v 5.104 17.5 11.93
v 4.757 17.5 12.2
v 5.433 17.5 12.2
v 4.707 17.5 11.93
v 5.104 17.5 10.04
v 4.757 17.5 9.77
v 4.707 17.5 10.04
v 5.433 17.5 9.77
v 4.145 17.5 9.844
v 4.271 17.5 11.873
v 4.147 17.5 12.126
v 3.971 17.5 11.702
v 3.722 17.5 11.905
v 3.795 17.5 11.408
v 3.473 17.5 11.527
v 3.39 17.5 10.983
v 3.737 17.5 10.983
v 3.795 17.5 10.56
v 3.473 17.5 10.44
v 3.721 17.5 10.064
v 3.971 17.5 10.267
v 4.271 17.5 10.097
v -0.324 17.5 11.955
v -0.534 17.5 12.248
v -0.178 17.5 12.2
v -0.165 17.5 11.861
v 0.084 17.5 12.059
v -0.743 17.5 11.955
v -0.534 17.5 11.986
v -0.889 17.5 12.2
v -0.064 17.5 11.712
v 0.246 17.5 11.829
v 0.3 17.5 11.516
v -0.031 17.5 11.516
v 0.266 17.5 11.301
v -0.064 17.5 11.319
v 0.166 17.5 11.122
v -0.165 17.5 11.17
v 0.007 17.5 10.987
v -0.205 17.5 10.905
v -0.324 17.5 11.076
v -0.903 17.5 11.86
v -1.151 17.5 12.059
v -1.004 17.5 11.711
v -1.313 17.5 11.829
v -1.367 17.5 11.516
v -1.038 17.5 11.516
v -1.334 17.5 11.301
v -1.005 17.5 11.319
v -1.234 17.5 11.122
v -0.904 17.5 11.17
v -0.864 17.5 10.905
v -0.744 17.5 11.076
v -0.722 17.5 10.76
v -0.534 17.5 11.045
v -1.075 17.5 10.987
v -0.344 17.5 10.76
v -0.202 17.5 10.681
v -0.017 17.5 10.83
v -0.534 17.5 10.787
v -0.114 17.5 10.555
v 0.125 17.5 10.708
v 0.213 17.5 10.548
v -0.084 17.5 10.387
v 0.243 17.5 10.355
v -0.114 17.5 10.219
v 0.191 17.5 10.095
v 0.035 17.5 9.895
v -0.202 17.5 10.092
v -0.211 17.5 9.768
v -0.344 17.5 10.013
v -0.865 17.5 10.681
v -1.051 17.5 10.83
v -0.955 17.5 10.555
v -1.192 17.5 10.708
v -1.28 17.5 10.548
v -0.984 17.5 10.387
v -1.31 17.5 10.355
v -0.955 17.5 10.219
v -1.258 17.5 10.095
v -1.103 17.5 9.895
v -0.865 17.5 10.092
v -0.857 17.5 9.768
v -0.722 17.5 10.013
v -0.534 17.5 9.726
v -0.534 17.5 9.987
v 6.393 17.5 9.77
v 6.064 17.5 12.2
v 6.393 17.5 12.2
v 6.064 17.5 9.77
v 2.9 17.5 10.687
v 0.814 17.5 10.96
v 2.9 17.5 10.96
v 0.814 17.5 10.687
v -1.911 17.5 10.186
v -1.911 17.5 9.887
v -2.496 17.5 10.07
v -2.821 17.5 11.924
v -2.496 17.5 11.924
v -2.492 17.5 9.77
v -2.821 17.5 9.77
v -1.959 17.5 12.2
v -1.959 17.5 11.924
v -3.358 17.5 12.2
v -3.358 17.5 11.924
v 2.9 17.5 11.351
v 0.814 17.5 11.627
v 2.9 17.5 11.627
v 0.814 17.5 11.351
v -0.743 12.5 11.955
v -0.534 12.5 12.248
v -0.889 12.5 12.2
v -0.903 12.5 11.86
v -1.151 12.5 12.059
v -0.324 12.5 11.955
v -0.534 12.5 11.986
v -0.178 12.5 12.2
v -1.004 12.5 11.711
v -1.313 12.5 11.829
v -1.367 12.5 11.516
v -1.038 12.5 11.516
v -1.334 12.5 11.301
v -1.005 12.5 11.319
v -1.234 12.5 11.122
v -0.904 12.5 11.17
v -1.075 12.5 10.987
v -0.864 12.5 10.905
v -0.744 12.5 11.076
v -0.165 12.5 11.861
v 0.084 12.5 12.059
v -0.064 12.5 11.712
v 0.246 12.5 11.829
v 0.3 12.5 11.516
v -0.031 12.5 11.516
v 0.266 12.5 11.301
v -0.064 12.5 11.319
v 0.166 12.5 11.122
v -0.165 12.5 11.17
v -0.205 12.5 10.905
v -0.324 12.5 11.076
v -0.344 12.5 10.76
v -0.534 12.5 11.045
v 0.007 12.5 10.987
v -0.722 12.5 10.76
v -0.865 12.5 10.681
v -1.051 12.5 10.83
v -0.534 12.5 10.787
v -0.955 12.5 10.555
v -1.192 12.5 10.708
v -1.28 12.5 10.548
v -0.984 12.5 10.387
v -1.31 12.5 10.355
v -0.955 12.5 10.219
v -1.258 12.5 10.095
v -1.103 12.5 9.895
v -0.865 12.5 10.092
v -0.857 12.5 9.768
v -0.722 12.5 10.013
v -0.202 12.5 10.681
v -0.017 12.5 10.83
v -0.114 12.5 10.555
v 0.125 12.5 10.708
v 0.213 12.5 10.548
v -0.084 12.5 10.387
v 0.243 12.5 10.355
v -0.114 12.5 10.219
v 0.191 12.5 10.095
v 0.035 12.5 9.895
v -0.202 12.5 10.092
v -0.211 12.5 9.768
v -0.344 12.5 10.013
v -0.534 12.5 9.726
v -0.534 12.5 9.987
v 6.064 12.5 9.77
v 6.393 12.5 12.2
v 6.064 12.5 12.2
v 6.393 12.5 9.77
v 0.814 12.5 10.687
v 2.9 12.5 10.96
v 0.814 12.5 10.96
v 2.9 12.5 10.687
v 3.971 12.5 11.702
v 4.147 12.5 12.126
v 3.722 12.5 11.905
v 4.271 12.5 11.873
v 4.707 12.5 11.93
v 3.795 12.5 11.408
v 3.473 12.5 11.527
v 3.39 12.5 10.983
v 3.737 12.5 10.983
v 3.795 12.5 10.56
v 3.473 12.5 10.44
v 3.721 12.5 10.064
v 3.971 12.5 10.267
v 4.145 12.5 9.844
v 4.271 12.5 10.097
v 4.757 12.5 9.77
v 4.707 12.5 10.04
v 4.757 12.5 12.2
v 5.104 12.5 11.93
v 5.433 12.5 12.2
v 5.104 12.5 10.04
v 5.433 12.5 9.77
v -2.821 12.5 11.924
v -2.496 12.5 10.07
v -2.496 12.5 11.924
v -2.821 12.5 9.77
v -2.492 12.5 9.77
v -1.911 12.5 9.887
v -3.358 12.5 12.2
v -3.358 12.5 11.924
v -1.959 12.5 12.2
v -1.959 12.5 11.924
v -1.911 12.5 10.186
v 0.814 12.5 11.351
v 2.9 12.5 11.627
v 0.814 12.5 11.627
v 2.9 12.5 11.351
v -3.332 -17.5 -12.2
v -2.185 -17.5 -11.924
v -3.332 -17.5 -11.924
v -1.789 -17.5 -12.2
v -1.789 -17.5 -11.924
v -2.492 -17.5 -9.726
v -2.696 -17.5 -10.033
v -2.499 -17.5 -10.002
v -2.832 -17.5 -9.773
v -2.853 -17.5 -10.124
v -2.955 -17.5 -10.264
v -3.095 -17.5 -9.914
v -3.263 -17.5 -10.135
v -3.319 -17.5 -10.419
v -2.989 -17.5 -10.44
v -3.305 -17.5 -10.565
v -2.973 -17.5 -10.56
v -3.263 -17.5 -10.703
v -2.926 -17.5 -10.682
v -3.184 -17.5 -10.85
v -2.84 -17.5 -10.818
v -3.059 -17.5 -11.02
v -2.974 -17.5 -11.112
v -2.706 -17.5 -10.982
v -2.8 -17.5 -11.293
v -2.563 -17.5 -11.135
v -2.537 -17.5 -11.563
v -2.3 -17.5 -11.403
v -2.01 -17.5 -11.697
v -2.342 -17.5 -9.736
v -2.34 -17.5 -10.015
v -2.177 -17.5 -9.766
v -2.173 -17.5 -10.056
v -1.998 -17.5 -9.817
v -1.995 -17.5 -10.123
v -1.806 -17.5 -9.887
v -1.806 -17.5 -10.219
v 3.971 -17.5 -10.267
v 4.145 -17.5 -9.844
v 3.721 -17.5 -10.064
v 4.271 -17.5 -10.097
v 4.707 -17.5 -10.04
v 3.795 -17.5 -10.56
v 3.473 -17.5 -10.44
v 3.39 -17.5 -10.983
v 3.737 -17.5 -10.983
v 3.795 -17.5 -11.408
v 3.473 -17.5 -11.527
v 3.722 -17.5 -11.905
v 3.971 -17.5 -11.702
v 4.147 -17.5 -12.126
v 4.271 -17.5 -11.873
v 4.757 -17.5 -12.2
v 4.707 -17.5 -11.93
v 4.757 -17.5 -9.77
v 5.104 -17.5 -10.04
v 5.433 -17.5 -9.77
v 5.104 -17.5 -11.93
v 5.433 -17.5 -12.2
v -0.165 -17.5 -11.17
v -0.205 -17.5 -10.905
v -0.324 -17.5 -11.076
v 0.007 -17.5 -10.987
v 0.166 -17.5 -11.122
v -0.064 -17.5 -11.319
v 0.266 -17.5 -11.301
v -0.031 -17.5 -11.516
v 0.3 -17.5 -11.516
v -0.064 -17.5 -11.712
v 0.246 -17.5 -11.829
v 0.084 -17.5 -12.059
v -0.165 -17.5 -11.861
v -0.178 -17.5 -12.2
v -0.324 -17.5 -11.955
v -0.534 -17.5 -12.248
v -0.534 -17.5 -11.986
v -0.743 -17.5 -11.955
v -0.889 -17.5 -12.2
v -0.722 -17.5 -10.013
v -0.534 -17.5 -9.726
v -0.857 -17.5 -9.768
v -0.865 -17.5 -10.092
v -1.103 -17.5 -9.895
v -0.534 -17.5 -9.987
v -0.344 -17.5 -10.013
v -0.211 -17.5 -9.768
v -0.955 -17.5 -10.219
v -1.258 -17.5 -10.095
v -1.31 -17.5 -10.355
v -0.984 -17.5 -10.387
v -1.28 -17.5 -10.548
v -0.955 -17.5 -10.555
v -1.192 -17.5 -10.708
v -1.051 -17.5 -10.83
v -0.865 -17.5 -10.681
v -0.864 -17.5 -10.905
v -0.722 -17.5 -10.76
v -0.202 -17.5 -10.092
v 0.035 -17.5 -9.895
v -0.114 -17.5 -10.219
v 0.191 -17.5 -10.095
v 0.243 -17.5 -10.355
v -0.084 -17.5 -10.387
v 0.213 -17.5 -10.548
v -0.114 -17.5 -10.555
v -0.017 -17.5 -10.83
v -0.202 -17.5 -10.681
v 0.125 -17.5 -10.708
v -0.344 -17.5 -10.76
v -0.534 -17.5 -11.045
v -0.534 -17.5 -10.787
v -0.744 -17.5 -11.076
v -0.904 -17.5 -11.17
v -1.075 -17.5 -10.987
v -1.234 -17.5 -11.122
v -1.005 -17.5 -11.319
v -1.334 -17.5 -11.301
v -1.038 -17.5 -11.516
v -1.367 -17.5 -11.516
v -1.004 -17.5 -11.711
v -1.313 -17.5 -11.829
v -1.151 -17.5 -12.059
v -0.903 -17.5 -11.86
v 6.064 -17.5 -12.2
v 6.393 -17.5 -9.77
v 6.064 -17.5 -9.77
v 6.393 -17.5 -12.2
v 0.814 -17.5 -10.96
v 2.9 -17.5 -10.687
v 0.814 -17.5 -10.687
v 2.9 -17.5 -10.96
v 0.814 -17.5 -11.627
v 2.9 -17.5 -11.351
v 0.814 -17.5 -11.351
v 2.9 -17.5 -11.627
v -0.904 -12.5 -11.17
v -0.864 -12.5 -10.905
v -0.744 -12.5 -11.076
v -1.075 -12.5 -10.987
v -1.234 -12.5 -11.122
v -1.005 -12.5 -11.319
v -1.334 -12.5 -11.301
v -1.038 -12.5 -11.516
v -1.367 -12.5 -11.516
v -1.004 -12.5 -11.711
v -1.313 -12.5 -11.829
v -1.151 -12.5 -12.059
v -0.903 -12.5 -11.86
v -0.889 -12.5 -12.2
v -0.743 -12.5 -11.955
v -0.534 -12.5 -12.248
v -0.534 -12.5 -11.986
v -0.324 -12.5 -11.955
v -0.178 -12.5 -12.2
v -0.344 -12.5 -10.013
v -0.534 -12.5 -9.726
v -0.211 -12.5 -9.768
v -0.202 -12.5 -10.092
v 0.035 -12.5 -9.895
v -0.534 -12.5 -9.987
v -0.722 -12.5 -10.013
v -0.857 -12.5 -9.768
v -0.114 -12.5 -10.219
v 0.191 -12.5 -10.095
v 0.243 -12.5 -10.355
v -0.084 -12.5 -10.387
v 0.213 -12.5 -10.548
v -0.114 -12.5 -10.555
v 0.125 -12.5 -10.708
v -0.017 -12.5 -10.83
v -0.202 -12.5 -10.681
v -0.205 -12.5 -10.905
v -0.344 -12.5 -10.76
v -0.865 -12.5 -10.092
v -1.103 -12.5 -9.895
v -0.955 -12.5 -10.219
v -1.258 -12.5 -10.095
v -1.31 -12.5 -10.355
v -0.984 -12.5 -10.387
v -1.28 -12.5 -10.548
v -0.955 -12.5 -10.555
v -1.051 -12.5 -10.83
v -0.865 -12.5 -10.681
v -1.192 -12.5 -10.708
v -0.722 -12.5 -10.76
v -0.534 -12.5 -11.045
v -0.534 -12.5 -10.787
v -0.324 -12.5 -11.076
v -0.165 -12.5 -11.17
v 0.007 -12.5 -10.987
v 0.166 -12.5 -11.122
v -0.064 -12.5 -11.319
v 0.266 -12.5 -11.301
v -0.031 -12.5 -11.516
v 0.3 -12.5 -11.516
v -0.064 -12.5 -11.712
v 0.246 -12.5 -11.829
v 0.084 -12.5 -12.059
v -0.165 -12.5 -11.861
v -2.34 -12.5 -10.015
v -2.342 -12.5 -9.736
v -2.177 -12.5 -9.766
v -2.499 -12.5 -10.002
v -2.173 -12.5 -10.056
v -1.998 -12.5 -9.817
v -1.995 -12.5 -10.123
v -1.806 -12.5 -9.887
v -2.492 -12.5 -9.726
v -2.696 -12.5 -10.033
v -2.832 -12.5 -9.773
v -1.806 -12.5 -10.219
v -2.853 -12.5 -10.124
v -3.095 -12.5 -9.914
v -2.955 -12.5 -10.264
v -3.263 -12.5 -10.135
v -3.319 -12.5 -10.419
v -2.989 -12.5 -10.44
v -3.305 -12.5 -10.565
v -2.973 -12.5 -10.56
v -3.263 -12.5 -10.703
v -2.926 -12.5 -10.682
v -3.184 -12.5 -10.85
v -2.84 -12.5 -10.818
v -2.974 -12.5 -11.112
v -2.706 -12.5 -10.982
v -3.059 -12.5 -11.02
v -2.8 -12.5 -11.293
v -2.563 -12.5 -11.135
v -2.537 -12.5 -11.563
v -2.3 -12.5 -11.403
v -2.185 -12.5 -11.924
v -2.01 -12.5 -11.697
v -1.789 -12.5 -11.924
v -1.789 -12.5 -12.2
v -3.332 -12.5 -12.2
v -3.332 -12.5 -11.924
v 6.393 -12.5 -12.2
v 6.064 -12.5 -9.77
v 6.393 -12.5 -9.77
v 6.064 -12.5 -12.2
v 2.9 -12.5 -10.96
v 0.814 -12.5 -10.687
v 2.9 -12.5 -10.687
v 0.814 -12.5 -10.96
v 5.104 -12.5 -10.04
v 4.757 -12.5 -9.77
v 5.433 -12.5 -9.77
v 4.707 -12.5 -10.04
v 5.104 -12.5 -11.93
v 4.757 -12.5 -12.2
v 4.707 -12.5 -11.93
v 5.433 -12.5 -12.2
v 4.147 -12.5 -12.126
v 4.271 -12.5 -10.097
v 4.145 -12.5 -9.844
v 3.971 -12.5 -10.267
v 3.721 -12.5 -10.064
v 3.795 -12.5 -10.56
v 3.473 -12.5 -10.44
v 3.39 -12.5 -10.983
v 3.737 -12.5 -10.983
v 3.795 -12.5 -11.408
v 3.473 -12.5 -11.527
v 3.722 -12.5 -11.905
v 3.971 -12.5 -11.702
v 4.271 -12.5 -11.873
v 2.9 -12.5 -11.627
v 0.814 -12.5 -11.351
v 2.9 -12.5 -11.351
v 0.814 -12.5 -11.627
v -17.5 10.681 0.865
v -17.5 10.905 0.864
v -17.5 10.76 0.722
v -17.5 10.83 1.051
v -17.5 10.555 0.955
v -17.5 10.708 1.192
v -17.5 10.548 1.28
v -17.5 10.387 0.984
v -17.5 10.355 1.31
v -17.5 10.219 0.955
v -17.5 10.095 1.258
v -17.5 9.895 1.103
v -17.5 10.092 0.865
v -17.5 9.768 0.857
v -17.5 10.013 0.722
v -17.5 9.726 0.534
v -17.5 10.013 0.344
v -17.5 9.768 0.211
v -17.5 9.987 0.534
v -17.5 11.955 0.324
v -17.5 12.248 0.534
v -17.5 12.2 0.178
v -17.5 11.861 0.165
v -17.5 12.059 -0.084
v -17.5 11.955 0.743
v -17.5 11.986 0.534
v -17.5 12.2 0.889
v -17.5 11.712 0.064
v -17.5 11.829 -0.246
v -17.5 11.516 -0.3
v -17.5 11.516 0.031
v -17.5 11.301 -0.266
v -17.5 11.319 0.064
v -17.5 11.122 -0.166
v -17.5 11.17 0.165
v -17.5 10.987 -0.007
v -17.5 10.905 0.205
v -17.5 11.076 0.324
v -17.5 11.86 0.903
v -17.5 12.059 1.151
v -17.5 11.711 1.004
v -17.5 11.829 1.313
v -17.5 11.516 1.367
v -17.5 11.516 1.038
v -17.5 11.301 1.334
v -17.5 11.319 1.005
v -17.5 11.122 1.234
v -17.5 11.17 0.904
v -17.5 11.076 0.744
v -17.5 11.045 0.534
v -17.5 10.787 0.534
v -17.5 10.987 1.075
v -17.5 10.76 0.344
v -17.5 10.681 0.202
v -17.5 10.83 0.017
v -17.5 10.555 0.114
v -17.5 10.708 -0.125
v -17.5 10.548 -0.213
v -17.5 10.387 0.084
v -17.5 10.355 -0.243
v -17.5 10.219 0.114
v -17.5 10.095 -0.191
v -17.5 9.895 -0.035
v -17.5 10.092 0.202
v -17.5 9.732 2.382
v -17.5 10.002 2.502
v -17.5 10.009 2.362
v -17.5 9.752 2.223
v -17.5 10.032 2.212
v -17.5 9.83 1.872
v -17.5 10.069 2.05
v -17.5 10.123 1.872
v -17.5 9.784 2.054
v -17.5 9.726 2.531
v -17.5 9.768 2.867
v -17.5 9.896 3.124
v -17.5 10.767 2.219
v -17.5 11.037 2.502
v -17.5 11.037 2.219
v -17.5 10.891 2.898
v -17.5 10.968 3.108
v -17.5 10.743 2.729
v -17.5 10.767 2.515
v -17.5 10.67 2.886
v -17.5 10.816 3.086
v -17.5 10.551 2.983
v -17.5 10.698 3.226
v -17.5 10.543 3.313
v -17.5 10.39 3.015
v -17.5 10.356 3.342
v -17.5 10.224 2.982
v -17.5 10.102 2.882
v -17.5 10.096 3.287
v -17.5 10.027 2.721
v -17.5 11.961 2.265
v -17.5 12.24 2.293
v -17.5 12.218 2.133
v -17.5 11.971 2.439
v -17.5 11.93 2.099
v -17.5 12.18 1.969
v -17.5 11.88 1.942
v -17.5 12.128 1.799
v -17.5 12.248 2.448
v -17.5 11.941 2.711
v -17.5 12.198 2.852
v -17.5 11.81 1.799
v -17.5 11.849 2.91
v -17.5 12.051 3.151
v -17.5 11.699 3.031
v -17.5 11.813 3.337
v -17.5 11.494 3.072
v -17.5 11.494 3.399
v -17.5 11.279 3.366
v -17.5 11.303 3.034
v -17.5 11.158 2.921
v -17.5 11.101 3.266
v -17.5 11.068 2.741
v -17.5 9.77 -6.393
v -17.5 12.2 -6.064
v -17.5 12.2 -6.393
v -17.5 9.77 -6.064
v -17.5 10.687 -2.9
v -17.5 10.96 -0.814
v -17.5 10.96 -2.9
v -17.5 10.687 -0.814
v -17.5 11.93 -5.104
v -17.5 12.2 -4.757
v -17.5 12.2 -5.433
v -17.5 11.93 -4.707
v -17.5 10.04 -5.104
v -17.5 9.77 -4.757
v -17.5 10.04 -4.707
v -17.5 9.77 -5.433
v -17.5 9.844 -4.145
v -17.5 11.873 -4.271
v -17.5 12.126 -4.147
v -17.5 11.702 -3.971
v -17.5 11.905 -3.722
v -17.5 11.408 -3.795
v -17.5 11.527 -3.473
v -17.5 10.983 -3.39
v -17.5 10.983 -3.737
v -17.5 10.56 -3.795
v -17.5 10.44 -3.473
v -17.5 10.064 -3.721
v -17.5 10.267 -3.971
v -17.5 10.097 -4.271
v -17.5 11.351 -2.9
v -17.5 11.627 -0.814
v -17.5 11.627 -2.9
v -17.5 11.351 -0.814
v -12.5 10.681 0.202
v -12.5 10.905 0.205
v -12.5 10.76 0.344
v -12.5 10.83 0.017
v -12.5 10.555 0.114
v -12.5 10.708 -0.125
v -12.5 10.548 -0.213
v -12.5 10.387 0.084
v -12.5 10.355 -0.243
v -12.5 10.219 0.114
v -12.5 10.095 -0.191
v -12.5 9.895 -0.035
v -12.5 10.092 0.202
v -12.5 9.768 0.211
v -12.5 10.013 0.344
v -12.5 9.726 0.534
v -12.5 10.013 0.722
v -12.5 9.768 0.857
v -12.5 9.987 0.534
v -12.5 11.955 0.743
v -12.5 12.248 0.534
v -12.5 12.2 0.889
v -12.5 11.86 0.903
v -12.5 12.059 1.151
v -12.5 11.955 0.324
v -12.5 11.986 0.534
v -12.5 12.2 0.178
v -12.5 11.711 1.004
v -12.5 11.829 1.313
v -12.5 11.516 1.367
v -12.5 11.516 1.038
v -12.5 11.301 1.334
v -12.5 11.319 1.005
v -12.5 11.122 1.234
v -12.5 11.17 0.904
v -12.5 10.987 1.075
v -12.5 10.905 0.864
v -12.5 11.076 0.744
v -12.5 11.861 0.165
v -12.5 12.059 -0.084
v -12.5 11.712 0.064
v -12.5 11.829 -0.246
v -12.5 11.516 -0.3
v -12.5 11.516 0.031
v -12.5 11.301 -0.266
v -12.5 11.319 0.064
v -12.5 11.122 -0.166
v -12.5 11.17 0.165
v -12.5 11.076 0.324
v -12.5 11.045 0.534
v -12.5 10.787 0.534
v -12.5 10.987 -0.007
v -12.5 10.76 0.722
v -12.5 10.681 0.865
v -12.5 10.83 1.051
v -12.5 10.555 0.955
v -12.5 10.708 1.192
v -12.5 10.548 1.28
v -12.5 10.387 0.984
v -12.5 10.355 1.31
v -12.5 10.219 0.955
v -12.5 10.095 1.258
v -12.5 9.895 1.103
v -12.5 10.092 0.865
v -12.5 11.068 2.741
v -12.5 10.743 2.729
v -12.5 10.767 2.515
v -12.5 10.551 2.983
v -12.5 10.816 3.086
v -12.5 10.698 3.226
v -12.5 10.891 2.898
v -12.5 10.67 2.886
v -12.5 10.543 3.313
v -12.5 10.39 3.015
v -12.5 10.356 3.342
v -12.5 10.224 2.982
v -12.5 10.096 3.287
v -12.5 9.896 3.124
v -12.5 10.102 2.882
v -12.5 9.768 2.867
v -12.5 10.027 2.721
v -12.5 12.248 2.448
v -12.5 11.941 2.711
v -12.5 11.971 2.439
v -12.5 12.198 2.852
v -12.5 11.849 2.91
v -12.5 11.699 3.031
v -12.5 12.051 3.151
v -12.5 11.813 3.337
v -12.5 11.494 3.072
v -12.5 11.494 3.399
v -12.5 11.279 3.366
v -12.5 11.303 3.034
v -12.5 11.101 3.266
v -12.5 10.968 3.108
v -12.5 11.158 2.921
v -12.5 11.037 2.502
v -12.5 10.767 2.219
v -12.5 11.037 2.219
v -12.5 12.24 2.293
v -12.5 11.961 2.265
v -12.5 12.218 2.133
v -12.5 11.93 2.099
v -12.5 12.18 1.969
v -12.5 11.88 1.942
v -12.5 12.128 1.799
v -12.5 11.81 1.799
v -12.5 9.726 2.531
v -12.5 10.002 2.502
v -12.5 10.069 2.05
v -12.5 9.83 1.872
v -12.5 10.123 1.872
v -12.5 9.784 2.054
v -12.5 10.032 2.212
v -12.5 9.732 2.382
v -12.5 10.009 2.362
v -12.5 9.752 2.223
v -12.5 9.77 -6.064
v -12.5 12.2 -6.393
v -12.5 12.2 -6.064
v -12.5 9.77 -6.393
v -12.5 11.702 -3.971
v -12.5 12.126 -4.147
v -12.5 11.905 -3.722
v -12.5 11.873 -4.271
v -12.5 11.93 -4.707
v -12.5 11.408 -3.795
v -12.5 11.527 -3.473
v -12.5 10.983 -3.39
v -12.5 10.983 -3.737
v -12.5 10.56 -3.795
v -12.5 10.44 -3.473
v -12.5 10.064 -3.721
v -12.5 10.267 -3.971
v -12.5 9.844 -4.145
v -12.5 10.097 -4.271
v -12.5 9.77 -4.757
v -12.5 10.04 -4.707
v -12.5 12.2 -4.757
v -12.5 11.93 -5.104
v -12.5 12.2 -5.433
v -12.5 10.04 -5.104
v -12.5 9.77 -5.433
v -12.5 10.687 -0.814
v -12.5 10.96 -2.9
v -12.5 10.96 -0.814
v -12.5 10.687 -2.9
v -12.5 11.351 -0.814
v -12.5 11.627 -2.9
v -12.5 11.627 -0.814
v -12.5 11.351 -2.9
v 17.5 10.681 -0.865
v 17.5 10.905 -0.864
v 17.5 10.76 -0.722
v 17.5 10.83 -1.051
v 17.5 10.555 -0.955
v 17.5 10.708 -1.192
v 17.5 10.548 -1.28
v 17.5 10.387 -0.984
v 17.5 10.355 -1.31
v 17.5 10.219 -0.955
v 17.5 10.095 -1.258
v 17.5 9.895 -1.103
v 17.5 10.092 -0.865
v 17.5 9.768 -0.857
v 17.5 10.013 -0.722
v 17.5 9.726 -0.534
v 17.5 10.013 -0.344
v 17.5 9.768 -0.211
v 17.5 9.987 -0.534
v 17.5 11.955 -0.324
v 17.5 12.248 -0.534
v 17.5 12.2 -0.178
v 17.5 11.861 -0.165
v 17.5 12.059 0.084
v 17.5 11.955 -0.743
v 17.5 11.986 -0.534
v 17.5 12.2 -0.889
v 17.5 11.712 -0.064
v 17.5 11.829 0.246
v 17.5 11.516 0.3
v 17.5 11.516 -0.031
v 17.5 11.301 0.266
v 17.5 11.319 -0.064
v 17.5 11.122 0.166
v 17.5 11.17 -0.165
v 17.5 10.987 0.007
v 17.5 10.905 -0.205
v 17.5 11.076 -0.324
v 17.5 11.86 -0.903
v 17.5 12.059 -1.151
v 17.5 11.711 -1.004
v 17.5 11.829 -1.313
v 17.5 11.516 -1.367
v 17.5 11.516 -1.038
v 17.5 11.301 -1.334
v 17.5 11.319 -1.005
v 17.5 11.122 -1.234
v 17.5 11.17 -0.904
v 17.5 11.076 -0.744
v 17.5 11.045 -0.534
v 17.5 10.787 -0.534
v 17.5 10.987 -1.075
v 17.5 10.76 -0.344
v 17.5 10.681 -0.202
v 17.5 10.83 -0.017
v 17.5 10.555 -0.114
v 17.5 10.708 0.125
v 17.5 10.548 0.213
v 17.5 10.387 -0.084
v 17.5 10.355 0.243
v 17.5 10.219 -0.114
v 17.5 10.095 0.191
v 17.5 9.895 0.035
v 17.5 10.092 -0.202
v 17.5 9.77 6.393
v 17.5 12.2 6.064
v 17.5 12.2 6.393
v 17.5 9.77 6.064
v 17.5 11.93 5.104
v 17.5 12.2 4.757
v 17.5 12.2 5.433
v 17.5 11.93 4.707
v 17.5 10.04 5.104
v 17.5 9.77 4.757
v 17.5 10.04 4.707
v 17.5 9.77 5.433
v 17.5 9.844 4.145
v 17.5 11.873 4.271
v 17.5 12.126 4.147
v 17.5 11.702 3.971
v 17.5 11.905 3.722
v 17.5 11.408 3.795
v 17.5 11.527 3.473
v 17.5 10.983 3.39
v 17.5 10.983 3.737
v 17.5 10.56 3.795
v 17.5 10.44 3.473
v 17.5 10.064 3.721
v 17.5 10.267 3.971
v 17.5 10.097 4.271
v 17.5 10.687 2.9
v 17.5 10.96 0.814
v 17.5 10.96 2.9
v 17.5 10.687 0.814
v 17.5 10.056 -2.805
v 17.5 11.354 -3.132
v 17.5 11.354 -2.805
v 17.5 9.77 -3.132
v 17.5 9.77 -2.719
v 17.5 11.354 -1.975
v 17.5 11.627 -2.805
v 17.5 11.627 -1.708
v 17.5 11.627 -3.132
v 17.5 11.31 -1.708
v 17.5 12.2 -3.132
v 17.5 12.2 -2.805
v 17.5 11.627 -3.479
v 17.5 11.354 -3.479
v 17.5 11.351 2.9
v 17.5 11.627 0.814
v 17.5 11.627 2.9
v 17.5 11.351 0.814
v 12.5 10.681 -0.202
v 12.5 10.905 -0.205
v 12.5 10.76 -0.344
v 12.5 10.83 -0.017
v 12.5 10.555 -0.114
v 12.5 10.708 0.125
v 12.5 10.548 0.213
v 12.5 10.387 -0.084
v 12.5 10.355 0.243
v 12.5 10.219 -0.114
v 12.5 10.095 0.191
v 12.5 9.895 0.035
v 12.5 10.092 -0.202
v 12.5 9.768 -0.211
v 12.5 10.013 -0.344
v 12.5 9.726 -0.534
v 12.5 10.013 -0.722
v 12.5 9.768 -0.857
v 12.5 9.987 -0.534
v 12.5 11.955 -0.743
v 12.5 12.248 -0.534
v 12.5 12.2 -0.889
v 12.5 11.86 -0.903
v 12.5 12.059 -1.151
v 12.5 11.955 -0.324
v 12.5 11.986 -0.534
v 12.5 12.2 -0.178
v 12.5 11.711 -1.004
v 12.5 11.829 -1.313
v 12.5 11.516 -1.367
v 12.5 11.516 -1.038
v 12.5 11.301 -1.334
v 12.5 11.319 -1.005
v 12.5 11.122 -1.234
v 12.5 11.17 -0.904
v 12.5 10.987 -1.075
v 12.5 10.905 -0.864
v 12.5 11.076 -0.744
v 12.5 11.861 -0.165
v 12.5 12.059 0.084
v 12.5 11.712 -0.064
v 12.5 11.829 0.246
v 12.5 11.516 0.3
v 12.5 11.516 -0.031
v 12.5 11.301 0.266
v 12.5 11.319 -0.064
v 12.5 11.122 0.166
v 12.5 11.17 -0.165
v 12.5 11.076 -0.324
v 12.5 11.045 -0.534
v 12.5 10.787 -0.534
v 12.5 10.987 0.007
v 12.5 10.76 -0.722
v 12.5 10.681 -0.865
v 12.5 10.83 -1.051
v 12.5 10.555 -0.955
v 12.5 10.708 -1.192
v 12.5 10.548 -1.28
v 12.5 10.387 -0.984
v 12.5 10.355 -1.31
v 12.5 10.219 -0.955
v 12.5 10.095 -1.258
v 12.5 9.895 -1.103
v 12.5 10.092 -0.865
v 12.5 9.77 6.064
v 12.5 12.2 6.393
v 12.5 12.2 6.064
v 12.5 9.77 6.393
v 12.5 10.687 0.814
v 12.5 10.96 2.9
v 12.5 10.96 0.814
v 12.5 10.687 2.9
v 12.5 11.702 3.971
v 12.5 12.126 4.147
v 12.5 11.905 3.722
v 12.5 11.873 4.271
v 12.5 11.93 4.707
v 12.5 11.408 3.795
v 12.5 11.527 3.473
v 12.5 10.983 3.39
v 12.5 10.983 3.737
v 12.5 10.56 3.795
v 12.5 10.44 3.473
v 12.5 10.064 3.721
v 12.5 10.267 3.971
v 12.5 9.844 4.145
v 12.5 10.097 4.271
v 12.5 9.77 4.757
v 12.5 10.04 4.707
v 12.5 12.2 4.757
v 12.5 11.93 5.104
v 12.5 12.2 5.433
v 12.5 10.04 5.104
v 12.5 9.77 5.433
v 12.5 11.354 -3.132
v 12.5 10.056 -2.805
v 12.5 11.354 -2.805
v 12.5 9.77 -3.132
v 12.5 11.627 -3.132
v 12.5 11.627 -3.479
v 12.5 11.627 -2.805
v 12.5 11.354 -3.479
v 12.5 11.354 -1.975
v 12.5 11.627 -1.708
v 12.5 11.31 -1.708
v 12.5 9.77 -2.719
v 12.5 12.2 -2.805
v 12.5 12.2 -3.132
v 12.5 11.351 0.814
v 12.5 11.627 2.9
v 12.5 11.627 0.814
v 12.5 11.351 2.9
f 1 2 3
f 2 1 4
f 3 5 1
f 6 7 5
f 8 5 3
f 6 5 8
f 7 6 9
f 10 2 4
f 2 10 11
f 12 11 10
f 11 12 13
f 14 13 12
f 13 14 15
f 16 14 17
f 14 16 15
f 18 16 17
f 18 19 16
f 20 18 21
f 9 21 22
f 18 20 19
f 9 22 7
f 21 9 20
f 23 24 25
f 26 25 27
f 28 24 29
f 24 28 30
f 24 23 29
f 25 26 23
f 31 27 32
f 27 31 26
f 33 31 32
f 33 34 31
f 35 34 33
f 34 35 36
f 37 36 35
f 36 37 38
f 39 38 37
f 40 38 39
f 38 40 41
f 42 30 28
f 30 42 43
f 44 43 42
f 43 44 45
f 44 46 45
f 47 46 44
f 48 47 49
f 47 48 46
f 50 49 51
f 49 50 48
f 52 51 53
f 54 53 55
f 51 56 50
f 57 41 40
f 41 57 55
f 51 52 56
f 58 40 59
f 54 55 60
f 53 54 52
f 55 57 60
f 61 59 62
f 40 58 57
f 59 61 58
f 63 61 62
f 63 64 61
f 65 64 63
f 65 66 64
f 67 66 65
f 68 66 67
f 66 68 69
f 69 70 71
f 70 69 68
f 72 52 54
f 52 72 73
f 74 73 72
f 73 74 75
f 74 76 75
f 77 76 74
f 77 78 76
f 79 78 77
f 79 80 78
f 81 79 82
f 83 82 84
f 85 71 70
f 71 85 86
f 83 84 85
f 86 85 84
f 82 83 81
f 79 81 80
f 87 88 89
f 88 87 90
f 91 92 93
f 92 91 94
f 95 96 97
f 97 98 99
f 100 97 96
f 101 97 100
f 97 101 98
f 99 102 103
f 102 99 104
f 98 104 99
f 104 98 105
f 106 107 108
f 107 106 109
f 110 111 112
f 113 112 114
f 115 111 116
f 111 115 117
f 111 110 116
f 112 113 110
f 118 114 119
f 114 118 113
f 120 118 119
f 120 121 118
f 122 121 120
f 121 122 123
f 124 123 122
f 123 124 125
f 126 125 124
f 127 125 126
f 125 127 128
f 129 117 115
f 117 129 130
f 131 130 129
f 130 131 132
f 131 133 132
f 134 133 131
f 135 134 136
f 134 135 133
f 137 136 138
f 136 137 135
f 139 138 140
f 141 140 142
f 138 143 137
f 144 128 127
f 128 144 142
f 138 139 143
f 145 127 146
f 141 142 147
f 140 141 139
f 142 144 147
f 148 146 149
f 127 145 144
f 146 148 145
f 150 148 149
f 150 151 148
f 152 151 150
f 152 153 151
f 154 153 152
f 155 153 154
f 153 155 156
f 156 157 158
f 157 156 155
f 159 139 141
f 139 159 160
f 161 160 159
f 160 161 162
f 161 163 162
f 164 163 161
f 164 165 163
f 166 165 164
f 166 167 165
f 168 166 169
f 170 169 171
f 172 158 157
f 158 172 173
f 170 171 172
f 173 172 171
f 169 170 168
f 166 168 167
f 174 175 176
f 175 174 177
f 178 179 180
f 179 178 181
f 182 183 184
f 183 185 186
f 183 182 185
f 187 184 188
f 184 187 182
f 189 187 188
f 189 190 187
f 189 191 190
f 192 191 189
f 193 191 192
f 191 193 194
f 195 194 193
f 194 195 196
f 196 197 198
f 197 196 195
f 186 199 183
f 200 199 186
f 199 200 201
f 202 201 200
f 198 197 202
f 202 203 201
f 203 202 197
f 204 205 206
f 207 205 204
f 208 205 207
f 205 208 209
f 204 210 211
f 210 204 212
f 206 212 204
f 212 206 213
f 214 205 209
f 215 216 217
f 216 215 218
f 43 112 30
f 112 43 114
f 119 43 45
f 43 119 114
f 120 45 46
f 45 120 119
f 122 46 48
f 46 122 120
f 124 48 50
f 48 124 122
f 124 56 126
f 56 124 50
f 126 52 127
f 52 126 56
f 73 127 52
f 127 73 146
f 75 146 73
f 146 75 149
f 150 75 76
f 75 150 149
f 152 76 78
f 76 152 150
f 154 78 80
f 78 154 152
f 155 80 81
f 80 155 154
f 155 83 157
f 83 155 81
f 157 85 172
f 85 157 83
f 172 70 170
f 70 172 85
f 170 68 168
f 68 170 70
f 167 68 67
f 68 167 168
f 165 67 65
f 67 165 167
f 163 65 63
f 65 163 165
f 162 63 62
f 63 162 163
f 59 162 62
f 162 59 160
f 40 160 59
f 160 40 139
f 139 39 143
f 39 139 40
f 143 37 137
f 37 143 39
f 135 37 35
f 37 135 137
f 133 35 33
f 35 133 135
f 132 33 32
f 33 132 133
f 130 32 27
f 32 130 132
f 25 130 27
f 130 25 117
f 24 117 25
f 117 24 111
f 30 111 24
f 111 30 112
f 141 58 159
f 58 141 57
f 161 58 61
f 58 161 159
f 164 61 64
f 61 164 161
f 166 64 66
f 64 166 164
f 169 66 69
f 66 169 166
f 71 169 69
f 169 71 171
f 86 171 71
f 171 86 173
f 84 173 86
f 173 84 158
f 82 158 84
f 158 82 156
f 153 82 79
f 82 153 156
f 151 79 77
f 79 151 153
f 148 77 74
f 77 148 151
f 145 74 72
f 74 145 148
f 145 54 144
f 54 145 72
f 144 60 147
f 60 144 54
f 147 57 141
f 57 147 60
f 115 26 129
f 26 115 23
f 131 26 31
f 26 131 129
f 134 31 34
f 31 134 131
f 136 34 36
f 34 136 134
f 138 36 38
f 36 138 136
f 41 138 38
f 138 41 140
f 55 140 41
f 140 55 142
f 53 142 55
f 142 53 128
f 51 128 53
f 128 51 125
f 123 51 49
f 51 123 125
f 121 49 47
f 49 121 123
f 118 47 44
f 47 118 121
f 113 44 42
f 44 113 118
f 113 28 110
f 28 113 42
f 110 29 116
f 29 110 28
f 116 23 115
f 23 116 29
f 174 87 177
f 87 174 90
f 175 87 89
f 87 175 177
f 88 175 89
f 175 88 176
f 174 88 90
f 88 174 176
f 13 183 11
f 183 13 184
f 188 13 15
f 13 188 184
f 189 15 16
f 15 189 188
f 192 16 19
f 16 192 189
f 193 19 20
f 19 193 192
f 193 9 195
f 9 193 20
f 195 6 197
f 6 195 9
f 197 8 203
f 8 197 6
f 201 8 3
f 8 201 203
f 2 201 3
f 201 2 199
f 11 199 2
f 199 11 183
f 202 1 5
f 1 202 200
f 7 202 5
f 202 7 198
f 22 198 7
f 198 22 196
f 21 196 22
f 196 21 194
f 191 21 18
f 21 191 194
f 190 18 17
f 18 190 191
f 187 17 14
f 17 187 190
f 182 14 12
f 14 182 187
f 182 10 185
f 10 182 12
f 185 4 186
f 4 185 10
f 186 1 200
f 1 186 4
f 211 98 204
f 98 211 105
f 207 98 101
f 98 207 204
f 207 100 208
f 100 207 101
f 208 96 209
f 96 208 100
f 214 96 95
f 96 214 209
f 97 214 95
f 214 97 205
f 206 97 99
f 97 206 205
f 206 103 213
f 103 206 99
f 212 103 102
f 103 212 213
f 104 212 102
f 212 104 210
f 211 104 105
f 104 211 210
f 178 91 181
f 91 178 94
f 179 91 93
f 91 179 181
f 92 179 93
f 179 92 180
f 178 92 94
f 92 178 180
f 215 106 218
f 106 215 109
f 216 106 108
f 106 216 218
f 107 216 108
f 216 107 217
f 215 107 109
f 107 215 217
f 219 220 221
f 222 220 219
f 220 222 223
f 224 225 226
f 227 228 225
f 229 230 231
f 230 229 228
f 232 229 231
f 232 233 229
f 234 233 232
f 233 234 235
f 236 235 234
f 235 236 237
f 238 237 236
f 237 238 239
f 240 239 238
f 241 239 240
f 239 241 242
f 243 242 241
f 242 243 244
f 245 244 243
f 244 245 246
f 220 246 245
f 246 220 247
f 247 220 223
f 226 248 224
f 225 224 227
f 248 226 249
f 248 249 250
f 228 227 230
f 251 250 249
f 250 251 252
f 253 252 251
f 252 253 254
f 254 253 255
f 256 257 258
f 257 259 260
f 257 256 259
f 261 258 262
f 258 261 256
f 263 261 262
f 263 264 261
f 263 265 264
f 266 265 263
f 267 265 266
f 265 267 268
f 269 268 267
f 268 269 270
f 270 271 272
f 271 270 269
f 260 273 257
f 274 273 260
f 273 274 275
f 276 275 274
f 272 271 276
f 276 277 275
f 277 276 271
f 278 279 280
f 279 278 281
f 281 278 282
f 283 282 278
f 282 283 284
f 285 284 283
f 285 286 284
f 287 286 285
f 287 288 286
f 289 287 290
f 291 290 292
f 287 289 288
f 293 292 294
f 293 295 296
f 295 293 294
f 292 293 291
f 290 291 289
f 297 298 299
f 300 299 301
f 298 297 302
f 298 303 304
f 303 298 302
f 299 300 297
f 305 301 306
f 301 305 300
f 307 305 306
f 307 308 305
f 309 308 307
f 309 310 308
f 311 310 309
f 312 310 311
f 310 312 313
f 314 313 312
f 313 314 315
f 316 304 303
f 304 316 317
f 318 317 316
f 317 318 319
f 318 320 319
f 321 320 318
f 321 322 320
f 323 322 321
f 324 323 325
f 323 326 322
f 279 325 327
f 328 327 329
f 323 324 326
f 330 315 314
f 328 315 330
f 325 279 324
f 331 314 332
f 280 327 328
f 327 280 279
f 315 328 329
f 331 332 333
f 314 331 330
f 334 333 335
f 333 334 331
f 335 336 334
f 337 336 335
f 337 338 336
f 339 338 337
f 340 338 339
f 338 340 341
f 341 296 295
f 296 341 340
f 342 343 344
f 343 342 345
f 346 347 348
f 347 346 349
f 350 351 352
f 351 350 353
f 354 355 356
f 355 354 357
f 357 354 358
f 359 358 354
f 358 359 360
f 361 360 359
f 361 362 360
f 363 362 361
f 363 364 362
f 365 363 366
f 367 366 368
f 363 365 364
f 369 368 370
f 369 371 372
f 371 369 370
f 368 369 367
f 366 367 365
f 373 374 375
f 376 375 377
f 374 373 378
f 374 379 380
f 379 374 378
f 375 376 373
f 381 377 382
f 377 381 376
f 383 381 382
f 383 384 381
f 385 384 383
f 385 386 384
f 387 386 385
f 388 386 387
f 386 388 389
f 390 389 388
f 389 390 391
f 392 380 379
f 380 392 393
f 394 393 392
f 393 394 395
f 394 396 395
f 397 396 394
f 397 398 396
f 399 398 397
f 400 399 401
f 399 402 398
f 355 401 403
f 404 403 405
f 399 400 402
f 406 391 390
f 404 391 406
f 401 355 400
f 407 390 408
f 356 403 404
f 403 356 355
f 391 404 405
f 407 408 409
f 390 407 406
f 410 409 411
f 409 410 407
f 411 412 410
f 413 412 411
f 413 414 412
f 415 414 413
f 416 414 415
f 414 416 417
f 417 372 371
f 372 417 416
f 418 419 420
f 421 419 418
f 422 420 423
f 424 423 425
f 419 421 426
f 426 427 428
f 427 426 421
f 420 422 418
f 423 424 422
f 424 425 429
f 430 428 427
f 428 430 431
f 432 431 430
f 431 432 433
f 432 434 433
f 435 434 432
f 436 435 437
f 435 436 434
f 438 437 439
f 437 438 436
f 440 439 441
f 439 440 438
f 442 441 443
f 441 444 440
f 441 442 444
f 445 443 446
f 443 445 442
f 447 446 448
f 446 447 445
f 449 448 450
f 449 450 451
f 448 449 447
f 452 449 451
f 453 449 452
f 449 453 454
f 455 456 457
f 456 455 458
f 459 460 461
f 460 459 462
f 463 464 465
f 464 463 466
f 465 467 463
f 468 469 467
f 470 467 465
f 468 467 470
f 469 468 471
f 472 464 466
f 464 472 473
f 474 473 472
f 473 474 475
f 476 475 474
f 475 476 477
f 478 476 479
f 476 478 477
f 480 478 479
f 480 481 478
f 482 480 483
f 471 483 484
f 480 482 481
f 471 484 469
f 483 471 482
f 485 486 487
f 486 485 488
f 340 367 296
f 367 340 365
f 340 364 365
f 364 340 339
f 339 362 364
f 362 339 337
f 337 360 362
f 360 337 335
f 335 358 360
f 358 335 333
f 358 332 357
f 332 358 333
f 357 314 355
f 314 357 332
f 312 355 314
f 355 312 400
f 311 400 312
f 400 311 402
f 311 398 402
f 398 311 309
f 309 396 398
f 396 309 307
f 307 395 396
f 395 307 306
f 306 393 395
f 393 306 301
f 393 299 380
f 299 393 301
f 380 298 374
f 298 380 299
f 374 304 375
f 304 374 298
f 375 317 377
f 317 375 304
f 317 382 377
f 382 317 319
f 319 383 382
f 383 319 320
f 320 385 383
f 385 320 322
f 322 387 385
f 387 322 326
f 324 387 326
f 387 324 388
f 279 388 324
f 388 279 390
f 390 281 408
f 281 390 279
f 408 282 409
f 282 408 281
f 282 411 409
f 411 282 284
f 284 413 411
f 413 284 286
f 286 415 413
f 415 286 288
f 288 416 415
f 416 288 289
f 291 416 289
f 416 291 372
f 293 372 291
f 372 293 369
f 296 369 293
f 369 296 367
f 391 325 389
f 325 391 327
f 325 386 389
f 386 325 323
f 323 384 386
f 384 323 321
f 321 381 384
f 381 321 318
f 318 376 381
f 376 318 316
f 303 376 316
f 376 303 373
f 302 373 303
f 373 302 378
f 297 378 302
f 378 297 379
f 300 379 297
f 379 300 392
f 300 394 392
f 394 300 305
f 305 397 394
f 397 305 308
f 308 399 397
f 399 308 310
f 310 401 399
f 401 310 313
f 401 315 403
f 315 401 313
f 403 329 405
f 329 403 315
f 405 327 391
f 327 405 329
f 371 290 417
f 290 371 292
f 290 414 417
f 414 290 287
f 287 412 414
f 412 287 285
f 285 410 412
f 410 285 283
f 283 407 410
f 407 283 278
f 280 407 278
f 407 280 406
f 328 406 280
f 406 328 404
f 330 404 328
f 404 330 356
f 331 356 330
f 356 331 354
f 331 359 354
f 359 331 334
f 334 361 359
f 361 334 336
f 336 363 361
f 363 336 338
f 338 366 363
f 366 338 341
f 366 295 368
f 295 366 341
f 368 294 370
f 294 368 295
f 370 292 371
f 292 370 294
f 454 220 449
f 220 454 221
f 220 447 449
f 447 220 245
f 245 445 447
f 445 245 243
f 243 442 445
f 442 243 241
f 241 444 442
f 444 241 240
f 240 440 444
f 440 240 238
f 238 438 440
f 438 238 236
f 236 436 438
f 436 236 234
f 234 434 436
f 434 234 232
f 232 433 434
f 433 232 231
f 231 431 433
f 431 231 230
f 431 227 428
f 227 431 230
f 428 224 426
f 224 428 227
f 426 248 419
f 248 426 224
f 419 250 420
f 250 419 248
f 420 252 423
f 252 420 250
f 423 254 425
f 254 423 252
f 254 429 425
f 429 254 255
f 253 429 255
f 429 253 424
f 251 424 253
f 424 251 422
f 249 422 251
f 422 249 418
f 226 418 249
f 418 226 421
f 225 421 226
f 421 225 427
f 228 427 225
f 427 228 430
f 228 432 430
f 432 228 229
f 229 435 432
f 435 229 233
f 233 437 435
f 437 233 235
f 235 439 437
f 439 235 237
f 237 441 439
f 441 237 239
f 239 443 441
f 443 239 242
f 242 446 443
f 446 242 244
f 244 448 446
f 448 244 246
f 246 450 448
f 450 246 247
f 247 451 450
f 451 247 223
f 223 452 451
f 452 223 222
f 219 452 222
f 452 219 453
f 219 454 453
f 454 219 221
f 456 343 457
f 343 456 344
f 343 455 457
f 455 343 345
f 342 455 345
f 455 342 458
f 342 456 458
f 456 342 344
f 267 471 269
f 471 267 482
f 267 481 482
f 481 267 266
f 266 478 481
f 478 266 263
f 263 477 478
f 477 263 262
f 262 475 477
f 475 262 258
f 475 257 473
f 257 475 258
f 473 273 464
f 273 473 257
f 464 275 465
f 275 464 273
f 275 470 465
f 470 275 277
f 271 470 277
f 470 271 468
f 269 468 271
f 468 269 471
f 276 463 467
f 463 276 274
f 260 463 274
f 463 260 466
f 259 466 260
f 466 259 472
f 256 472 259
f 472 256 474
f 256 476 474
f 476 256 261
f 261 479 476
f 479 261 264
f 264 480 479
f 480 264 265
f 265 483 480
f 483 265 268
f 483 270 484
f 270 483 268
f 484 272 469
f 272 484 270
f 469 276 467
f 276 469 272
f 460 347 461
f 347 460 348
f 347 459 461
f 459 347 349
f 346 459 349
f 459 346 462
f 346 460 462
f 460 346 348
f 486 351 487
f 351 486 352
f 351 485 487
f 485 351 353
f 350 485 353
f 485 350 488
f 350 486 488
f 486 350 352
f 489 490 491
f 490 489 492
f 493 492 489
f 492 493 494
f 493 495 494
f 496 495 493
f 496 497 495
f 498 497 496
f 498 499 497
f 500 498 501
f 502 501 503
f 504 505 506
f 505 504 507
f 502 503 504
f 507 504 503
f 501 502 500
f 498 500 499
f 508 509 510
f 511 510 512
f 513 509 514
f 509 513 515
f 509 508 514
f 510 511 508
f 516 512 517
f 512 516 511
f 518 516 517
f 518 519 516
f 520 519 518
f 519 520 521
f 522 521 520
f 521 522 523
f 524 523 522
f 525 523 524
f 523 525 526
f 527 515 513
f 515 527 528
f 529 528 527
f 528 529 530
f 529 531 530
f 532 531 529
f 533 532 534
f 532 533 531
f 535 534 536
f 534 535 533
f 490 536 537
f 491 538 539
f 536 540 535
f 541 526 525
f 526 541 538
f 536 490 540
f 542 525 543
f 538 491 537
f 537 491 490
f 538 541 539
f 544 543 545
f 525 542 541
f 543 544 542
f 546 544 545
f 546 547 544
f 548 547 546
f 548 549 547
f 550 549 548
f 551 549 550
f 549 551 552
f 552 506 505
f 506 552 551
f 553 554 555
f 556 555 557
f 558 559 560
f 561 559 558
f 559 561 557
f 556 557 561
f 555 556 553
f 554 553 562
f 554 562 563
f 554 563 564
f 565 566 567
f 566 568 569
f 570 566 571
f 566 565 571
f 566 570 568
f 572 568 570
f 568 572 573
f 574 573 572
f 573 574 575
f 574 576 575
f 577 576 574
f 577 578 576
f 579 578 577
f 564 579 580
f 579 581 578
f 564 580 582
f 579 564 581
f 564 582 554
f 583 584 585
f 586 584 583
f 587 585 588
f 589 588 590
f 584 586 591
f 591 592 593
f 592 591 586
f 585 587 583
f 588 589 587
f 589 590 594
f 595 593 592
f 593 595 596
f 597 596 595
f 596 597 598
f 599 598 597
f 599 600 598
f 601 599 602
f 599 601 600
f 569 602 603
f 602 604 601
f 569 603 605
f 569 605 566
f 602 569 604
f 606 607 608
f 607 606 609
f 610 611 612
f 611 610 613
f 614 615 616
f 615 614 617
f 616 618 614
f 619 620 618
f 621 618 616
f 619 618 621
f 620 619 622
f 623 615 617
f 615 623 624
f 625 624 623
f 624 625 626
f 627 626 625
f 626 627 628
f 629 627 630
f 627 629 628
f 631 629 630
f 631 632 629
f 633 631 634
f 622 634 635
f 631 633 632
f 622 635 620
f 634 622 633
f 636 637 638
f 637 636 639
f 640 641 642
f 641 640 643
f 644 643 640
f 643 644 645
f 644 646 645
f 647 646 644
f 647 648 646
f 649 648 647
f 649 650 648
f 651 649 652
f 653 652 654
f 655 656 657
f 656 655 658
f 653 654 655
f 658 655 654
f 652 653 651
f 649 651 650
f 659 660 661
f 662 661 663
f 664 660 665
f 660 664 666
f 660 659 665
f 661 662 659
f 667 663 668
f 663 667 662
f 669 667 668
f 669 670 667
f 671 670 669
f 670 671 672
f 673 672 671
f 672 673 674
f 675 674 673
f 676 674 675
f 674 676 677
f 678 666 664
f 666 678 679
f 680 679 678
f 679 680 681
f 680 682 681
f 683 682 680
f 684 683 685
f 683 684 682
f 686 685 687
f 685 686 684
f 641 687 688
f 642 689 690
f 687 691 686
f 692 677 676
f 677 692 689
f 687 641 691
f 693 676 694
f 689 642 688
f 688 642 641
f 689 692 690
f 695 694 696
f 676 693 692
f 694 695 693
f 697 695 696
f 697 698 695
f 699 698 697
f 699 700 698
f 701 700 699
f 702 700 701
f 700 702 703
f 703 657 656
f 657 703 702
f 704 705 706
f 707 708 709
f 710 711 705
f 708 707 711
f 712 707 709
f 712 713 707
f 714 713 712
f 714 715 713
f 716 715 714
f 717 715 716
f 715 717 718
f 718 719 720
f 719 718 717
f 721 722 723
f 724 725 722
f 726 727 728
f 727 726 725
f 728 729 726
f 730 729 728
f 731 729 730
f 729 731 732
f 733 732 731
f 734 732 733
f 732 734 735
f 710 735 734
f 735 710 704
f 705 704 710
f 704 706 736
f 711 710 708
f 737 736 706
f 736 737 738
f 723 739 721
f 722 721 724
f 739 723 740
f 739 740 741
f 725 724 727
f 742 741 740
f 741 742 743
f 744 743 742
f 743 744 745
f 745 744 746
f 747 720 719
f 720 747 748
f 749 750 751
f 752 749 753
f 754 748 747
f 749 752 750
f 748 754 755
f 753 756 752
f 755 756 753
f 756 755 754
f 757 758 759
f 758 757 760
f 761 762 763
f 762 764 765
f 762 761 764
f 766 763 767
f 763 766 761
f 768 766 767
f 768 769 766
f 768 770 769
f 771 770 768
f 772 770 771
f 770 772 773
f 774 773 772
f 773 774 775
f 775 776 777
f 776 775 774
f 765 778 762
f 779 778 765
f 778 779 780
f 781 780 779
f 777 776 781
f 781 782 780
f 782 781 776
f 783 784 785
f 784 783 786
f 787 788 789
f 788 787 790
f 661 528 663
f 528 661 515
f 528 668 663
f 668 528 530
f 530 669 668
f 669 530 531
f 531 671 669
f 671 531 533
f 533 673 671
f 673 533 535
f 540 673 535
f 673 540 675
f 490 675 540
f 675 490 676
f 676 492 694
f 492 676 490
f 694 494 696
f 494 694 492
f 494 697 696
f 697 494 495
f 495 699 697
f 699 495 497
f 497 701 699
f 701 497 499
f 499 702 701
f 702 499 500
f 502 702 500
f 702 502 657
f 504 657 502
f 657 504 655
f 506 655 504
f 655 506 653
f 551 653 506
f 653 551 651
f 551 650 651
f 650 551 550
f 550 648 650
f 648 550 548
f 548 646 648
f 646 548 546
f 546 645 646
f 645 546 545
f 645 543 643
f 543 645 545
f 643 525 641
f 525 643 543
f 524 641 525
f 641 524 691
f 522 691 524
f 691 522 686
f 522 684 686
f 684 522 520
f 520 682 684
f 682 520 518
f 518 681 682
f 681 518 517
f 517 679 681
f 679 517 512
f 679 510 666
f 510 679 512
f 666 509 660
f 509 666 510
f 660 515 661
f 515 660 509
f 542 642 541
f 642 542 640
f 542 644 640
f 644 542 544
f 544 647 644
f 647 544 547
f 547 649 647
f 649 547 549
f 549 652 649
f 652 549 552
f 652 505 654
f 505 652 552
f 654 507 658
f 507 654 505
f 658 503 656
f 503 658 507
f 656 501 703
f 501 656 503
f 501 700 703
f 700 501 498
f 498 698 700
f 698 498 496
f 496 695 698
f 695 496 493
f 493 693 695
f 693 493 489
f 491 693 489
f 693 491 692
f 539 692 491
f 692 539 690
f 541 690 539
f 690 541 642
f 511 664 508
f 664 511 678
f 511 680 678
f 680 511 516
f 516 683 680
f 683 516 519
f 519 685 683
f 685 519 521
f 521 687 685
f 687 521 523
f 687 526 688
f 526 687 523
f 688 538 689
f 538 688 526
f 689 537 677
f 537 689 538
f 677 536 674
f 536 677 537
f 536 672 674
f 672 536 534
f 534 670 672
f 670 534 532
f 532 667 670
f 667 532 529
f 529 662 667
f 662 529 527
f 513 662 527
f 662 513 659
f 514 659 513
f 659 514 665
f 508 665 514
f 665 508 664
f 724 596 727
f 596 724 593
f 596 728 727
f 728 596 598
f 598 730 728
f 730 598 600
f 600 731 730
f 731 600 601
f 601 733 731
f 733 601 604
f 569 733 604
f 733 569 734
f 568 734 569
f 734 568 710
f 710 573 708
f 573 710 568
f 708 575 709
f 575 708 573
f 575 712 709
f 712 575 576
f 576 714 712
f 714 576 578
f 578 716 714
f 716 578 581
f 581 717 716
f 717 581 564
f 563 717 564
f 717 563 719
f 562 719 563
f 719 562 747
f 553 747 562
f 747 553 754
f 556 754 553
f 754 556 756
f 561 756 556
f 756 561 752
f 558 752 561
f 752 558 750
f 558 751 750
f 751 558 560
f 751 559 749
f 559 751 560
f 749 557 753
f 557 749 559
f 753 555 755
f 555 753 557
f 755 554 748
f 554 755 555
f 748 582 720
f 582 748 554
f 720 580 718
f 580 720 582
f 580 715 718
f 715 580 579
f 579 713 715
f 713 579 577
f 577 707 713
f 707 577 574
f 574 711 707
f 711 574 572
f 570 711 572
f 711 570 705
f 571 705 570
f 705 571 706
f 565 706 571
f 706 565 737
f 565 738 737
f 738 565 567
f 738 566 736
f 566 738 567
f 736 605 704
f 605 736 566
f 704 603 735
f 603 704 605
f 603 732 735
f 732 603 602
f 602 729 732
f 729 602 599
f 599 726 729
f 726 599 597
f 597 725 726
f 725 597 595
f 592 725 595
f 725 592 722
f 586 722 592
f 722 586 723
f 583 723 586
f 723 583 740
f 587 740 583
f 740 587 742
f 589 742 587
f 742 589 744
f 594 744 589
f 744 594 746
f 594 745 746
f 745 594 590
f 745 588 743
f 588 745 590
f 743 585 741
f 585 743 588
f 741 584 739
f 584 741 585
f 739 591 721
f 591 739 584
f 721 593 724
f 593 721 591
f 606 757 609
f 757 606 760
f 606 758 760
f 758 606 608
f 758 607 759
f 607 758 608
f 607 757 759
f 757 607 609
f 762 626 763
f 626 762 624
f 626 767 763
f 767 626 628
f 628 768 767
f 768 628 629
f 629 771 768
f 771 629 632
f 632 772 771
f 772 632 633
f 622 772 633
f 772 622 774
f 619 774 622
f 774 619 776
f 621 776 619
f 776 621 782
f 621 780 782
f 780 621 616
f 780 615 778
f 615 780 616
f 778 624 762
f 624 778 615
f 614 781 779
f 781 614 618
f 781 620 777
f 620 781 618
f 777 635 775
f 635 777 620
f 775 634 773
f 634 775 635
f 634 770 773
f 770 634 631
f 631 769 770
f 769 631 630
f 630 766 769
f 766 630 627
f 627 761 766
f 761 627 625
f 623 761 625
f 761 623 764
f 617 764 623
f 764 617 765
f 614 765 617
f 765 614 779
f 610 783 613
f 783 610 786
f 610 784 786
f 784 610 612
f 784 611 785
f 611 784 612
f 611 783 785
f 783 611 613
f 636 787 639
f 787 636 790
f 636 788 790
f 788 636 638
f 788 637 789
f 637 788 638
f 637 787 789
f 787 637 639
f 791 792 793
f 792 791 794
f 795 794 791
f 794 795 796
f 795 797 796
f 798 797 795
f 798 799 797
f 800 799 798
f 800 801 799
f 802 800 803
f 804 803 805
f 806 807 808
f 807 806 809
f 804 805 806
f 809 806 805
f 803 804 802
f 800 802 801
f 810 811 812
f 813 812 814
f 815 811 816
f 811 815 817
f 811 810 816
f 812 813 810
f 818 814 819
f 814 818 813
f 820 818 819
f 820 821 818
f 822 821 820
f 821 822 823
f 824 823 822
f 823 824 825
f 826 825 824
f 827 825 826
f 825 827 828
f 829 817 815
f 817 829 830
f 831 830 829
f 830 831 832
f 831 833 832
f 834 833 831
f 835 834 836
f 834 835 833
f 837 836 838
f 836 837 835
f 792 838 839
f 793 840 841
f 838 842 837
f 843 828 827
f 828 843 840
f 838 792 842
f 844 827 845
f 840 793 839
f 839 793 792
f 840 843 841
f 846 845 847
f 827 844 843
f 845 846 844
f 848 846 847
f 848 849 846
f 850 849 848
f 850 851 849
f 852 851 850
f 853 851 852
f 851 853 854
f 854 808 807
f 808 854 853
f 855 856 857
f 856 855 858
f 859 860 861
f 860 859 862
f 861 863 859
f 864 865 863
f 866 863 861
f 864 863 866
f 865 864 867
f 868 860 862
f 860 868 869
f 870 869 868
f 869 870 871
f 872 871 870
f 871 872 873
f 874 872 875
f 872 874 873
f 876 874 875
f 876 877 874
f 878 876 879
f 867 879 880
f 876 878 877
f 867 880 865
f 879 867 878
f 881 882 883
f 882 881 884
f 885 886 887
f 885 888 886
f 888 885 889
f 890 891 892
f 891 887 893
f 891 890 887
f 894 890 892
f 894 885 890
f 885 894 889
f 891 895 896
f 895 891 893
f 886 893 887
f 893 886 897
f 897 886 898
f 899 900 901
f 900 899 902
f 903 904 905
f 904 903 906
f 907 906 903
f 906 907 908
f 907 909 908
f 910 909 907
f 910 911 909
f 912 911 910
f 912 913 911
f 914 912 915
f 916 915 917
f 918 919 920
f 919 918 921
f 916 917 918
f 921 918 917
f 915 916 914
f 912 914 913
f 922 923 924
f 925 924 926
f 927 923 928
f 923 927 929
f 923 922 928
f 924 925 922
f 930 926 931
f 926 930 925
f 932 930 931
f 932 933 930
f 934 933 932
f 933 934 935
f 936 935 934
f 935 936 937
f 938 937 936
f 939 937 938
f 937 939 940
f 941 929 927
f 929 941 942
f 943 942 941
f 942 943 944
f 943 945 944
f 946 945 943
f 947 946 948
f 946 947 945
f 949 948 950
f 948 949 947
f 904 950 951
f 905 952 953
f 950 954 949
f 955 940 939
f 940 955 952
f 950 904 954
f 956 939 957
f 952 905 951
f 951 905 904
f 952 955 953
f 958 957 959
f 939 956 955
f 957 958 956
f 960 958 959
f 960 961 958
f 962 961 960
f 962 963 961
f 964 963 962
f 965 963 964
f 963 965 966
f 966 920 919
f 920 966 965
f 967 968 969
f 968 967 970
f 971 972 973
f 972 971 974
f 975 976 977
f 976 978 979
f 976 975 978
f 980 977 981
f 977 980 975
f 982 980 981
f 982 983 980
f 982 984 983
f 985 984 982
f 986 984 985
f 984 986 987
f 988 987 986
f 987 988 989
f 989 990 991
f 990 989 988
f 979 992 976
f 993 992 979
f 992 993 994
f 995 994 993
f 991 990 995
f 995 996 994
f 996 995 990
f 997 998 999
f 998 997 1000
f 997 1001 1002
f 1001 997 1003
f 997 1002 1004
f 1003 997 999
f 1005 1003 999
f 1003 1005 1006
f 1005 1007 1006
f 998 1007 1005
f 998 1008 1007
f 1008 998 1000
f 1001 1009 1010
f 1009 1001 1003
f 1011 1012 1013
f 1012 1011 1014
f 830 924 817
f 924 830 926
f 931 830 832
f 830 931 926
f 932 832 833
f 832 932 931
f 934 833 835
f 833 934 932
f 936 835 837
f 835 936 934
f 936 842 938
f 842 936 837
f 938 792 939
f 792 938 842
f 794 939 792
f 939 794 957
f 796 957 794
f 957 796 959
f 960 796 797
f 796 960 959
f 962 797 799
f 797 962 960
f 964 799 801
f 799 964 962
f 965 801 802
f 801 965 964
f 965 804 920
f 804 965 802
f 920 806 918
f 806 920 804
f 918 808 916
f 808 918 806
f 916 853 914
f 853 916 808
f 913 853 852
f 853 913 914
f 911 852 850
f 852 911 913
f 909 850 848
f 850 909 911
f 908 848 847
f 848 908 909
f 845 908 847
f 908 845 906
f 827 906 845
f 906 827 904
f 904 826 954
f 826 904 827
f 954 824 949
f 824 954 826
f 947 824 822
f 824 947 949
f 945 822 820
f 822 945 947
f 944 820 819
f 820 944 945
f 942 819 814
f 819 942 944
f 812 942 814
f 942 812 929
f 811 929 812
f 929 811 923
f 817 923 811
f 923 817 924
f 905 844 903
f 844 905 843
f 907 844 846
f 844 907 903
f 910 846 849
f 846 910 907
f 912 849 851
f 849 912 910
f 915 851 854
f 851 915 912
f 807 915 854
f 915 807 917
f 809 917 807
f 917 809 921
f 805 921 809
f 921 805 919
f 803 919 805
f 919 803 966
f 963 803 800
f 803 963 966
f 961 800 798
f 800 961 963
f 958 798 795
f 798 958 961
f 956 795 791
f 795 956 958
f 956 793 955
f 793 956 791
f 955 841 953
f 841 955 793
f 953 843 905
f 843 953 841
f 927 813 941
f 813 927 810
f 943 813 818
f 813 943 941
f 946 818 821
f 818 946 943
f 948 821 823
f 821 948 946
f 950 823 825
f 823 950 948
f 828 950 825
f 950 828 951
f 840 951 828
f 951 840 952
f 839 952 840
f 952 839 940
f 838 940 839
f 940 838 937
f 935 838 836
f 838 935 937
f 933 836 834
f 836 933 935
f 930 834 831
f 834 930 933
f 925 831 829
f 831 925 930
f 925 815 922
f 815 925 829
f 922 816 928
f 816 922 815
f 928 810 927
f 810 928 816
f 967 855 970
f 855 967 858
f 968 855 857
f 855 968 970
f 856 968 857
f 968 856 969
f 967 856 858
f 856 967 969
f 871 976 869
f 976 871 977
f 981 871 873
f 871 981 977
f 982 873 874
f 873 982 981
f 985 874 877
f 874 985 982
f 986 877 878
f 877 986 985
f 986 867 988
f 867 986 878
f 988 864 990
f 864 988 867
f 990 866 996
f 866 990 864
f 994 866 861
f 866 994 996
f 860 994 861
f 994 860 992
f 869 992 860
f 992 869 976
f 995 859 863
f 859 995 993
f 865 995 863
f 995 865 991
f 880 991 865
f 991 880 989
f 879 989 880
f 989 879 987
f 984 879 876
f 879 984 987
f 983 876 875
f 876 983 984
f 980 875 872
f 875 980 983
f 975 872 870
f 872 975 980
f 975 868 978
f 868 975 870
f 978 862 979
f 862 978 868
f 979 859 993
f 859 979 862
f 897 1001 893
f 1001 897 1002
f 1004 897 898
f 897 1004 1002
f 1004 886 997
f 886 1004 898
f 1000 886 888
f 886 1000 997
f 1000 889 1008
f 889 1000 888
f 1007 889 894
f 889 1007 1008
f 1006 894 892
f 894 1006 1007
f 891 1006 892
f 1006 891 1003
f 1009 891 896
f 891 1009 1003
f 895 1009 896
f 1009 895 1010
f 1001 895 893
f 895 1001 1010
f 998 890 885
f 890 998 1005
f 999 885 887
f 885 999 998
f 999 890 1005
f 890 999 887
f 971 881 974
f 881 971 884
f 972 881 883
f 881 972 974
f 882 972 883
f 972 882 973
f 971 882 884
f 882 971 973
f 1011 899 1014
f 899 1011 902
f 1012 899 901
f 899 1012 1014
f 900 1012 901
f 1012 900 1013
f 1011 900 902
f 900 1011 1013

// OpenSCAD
// file: modules.scad
zoom = [0.8,0.8,1];

module white( filename, text)
{
    scale(zoom)
    rotate([0,0,90]) 
    union(){ 
        translate([21.5,-8.4,-2.5])   rotate([0,0,90])  linear_extrude(5)  text (text,font="bold",size=3); 
        intersection() 
        {    
            cube([35,35,5],center=true); 
            translate([3,0,2.6])    scale([0.14,0.14,-1])  
            surface(file = filename, center = true); 
        } 
    } 

};

module black( filename, text)
{
    scale(zoom)
    rotate([0,0,90]) 
    difference() 
    {    
        translate([5,0,0])  cube([35,35,5],center=true); 
        translate([3,0,2.6])    scale([0.14,0.14,-1])  
        surface(file = filename, center = true);
        translate([21.5,-8.4,-2.5])   rotate([0,0,90])  linear_extrude(6)  text (text,font="bold",size=3);
    } 
}

module shape()
{
    scale(zoom)   rotate([0,0,90]) translate([5,0,0])  cube([35,35,5],center=true);  
}
// main file
include <modules.scad>

union() color([0,1,0])
{
    rotate([90,0,0])    translate([0,-5,-15])   white("../aruco/Marker81.png","ID=81");  
    rotate([-90,0,0])    translate([0,-5,-15])  white("../aruco/Marker82.png","ID=82");  
    rotate([00,90,0])    translate([0,-5,-15])  white("../aruco/Marker83.png","ID=83");  
    rotate([00,-90,0])    translate([0,-5,-15]) white("../aruco/Marker84.png","ID=84");  
}
